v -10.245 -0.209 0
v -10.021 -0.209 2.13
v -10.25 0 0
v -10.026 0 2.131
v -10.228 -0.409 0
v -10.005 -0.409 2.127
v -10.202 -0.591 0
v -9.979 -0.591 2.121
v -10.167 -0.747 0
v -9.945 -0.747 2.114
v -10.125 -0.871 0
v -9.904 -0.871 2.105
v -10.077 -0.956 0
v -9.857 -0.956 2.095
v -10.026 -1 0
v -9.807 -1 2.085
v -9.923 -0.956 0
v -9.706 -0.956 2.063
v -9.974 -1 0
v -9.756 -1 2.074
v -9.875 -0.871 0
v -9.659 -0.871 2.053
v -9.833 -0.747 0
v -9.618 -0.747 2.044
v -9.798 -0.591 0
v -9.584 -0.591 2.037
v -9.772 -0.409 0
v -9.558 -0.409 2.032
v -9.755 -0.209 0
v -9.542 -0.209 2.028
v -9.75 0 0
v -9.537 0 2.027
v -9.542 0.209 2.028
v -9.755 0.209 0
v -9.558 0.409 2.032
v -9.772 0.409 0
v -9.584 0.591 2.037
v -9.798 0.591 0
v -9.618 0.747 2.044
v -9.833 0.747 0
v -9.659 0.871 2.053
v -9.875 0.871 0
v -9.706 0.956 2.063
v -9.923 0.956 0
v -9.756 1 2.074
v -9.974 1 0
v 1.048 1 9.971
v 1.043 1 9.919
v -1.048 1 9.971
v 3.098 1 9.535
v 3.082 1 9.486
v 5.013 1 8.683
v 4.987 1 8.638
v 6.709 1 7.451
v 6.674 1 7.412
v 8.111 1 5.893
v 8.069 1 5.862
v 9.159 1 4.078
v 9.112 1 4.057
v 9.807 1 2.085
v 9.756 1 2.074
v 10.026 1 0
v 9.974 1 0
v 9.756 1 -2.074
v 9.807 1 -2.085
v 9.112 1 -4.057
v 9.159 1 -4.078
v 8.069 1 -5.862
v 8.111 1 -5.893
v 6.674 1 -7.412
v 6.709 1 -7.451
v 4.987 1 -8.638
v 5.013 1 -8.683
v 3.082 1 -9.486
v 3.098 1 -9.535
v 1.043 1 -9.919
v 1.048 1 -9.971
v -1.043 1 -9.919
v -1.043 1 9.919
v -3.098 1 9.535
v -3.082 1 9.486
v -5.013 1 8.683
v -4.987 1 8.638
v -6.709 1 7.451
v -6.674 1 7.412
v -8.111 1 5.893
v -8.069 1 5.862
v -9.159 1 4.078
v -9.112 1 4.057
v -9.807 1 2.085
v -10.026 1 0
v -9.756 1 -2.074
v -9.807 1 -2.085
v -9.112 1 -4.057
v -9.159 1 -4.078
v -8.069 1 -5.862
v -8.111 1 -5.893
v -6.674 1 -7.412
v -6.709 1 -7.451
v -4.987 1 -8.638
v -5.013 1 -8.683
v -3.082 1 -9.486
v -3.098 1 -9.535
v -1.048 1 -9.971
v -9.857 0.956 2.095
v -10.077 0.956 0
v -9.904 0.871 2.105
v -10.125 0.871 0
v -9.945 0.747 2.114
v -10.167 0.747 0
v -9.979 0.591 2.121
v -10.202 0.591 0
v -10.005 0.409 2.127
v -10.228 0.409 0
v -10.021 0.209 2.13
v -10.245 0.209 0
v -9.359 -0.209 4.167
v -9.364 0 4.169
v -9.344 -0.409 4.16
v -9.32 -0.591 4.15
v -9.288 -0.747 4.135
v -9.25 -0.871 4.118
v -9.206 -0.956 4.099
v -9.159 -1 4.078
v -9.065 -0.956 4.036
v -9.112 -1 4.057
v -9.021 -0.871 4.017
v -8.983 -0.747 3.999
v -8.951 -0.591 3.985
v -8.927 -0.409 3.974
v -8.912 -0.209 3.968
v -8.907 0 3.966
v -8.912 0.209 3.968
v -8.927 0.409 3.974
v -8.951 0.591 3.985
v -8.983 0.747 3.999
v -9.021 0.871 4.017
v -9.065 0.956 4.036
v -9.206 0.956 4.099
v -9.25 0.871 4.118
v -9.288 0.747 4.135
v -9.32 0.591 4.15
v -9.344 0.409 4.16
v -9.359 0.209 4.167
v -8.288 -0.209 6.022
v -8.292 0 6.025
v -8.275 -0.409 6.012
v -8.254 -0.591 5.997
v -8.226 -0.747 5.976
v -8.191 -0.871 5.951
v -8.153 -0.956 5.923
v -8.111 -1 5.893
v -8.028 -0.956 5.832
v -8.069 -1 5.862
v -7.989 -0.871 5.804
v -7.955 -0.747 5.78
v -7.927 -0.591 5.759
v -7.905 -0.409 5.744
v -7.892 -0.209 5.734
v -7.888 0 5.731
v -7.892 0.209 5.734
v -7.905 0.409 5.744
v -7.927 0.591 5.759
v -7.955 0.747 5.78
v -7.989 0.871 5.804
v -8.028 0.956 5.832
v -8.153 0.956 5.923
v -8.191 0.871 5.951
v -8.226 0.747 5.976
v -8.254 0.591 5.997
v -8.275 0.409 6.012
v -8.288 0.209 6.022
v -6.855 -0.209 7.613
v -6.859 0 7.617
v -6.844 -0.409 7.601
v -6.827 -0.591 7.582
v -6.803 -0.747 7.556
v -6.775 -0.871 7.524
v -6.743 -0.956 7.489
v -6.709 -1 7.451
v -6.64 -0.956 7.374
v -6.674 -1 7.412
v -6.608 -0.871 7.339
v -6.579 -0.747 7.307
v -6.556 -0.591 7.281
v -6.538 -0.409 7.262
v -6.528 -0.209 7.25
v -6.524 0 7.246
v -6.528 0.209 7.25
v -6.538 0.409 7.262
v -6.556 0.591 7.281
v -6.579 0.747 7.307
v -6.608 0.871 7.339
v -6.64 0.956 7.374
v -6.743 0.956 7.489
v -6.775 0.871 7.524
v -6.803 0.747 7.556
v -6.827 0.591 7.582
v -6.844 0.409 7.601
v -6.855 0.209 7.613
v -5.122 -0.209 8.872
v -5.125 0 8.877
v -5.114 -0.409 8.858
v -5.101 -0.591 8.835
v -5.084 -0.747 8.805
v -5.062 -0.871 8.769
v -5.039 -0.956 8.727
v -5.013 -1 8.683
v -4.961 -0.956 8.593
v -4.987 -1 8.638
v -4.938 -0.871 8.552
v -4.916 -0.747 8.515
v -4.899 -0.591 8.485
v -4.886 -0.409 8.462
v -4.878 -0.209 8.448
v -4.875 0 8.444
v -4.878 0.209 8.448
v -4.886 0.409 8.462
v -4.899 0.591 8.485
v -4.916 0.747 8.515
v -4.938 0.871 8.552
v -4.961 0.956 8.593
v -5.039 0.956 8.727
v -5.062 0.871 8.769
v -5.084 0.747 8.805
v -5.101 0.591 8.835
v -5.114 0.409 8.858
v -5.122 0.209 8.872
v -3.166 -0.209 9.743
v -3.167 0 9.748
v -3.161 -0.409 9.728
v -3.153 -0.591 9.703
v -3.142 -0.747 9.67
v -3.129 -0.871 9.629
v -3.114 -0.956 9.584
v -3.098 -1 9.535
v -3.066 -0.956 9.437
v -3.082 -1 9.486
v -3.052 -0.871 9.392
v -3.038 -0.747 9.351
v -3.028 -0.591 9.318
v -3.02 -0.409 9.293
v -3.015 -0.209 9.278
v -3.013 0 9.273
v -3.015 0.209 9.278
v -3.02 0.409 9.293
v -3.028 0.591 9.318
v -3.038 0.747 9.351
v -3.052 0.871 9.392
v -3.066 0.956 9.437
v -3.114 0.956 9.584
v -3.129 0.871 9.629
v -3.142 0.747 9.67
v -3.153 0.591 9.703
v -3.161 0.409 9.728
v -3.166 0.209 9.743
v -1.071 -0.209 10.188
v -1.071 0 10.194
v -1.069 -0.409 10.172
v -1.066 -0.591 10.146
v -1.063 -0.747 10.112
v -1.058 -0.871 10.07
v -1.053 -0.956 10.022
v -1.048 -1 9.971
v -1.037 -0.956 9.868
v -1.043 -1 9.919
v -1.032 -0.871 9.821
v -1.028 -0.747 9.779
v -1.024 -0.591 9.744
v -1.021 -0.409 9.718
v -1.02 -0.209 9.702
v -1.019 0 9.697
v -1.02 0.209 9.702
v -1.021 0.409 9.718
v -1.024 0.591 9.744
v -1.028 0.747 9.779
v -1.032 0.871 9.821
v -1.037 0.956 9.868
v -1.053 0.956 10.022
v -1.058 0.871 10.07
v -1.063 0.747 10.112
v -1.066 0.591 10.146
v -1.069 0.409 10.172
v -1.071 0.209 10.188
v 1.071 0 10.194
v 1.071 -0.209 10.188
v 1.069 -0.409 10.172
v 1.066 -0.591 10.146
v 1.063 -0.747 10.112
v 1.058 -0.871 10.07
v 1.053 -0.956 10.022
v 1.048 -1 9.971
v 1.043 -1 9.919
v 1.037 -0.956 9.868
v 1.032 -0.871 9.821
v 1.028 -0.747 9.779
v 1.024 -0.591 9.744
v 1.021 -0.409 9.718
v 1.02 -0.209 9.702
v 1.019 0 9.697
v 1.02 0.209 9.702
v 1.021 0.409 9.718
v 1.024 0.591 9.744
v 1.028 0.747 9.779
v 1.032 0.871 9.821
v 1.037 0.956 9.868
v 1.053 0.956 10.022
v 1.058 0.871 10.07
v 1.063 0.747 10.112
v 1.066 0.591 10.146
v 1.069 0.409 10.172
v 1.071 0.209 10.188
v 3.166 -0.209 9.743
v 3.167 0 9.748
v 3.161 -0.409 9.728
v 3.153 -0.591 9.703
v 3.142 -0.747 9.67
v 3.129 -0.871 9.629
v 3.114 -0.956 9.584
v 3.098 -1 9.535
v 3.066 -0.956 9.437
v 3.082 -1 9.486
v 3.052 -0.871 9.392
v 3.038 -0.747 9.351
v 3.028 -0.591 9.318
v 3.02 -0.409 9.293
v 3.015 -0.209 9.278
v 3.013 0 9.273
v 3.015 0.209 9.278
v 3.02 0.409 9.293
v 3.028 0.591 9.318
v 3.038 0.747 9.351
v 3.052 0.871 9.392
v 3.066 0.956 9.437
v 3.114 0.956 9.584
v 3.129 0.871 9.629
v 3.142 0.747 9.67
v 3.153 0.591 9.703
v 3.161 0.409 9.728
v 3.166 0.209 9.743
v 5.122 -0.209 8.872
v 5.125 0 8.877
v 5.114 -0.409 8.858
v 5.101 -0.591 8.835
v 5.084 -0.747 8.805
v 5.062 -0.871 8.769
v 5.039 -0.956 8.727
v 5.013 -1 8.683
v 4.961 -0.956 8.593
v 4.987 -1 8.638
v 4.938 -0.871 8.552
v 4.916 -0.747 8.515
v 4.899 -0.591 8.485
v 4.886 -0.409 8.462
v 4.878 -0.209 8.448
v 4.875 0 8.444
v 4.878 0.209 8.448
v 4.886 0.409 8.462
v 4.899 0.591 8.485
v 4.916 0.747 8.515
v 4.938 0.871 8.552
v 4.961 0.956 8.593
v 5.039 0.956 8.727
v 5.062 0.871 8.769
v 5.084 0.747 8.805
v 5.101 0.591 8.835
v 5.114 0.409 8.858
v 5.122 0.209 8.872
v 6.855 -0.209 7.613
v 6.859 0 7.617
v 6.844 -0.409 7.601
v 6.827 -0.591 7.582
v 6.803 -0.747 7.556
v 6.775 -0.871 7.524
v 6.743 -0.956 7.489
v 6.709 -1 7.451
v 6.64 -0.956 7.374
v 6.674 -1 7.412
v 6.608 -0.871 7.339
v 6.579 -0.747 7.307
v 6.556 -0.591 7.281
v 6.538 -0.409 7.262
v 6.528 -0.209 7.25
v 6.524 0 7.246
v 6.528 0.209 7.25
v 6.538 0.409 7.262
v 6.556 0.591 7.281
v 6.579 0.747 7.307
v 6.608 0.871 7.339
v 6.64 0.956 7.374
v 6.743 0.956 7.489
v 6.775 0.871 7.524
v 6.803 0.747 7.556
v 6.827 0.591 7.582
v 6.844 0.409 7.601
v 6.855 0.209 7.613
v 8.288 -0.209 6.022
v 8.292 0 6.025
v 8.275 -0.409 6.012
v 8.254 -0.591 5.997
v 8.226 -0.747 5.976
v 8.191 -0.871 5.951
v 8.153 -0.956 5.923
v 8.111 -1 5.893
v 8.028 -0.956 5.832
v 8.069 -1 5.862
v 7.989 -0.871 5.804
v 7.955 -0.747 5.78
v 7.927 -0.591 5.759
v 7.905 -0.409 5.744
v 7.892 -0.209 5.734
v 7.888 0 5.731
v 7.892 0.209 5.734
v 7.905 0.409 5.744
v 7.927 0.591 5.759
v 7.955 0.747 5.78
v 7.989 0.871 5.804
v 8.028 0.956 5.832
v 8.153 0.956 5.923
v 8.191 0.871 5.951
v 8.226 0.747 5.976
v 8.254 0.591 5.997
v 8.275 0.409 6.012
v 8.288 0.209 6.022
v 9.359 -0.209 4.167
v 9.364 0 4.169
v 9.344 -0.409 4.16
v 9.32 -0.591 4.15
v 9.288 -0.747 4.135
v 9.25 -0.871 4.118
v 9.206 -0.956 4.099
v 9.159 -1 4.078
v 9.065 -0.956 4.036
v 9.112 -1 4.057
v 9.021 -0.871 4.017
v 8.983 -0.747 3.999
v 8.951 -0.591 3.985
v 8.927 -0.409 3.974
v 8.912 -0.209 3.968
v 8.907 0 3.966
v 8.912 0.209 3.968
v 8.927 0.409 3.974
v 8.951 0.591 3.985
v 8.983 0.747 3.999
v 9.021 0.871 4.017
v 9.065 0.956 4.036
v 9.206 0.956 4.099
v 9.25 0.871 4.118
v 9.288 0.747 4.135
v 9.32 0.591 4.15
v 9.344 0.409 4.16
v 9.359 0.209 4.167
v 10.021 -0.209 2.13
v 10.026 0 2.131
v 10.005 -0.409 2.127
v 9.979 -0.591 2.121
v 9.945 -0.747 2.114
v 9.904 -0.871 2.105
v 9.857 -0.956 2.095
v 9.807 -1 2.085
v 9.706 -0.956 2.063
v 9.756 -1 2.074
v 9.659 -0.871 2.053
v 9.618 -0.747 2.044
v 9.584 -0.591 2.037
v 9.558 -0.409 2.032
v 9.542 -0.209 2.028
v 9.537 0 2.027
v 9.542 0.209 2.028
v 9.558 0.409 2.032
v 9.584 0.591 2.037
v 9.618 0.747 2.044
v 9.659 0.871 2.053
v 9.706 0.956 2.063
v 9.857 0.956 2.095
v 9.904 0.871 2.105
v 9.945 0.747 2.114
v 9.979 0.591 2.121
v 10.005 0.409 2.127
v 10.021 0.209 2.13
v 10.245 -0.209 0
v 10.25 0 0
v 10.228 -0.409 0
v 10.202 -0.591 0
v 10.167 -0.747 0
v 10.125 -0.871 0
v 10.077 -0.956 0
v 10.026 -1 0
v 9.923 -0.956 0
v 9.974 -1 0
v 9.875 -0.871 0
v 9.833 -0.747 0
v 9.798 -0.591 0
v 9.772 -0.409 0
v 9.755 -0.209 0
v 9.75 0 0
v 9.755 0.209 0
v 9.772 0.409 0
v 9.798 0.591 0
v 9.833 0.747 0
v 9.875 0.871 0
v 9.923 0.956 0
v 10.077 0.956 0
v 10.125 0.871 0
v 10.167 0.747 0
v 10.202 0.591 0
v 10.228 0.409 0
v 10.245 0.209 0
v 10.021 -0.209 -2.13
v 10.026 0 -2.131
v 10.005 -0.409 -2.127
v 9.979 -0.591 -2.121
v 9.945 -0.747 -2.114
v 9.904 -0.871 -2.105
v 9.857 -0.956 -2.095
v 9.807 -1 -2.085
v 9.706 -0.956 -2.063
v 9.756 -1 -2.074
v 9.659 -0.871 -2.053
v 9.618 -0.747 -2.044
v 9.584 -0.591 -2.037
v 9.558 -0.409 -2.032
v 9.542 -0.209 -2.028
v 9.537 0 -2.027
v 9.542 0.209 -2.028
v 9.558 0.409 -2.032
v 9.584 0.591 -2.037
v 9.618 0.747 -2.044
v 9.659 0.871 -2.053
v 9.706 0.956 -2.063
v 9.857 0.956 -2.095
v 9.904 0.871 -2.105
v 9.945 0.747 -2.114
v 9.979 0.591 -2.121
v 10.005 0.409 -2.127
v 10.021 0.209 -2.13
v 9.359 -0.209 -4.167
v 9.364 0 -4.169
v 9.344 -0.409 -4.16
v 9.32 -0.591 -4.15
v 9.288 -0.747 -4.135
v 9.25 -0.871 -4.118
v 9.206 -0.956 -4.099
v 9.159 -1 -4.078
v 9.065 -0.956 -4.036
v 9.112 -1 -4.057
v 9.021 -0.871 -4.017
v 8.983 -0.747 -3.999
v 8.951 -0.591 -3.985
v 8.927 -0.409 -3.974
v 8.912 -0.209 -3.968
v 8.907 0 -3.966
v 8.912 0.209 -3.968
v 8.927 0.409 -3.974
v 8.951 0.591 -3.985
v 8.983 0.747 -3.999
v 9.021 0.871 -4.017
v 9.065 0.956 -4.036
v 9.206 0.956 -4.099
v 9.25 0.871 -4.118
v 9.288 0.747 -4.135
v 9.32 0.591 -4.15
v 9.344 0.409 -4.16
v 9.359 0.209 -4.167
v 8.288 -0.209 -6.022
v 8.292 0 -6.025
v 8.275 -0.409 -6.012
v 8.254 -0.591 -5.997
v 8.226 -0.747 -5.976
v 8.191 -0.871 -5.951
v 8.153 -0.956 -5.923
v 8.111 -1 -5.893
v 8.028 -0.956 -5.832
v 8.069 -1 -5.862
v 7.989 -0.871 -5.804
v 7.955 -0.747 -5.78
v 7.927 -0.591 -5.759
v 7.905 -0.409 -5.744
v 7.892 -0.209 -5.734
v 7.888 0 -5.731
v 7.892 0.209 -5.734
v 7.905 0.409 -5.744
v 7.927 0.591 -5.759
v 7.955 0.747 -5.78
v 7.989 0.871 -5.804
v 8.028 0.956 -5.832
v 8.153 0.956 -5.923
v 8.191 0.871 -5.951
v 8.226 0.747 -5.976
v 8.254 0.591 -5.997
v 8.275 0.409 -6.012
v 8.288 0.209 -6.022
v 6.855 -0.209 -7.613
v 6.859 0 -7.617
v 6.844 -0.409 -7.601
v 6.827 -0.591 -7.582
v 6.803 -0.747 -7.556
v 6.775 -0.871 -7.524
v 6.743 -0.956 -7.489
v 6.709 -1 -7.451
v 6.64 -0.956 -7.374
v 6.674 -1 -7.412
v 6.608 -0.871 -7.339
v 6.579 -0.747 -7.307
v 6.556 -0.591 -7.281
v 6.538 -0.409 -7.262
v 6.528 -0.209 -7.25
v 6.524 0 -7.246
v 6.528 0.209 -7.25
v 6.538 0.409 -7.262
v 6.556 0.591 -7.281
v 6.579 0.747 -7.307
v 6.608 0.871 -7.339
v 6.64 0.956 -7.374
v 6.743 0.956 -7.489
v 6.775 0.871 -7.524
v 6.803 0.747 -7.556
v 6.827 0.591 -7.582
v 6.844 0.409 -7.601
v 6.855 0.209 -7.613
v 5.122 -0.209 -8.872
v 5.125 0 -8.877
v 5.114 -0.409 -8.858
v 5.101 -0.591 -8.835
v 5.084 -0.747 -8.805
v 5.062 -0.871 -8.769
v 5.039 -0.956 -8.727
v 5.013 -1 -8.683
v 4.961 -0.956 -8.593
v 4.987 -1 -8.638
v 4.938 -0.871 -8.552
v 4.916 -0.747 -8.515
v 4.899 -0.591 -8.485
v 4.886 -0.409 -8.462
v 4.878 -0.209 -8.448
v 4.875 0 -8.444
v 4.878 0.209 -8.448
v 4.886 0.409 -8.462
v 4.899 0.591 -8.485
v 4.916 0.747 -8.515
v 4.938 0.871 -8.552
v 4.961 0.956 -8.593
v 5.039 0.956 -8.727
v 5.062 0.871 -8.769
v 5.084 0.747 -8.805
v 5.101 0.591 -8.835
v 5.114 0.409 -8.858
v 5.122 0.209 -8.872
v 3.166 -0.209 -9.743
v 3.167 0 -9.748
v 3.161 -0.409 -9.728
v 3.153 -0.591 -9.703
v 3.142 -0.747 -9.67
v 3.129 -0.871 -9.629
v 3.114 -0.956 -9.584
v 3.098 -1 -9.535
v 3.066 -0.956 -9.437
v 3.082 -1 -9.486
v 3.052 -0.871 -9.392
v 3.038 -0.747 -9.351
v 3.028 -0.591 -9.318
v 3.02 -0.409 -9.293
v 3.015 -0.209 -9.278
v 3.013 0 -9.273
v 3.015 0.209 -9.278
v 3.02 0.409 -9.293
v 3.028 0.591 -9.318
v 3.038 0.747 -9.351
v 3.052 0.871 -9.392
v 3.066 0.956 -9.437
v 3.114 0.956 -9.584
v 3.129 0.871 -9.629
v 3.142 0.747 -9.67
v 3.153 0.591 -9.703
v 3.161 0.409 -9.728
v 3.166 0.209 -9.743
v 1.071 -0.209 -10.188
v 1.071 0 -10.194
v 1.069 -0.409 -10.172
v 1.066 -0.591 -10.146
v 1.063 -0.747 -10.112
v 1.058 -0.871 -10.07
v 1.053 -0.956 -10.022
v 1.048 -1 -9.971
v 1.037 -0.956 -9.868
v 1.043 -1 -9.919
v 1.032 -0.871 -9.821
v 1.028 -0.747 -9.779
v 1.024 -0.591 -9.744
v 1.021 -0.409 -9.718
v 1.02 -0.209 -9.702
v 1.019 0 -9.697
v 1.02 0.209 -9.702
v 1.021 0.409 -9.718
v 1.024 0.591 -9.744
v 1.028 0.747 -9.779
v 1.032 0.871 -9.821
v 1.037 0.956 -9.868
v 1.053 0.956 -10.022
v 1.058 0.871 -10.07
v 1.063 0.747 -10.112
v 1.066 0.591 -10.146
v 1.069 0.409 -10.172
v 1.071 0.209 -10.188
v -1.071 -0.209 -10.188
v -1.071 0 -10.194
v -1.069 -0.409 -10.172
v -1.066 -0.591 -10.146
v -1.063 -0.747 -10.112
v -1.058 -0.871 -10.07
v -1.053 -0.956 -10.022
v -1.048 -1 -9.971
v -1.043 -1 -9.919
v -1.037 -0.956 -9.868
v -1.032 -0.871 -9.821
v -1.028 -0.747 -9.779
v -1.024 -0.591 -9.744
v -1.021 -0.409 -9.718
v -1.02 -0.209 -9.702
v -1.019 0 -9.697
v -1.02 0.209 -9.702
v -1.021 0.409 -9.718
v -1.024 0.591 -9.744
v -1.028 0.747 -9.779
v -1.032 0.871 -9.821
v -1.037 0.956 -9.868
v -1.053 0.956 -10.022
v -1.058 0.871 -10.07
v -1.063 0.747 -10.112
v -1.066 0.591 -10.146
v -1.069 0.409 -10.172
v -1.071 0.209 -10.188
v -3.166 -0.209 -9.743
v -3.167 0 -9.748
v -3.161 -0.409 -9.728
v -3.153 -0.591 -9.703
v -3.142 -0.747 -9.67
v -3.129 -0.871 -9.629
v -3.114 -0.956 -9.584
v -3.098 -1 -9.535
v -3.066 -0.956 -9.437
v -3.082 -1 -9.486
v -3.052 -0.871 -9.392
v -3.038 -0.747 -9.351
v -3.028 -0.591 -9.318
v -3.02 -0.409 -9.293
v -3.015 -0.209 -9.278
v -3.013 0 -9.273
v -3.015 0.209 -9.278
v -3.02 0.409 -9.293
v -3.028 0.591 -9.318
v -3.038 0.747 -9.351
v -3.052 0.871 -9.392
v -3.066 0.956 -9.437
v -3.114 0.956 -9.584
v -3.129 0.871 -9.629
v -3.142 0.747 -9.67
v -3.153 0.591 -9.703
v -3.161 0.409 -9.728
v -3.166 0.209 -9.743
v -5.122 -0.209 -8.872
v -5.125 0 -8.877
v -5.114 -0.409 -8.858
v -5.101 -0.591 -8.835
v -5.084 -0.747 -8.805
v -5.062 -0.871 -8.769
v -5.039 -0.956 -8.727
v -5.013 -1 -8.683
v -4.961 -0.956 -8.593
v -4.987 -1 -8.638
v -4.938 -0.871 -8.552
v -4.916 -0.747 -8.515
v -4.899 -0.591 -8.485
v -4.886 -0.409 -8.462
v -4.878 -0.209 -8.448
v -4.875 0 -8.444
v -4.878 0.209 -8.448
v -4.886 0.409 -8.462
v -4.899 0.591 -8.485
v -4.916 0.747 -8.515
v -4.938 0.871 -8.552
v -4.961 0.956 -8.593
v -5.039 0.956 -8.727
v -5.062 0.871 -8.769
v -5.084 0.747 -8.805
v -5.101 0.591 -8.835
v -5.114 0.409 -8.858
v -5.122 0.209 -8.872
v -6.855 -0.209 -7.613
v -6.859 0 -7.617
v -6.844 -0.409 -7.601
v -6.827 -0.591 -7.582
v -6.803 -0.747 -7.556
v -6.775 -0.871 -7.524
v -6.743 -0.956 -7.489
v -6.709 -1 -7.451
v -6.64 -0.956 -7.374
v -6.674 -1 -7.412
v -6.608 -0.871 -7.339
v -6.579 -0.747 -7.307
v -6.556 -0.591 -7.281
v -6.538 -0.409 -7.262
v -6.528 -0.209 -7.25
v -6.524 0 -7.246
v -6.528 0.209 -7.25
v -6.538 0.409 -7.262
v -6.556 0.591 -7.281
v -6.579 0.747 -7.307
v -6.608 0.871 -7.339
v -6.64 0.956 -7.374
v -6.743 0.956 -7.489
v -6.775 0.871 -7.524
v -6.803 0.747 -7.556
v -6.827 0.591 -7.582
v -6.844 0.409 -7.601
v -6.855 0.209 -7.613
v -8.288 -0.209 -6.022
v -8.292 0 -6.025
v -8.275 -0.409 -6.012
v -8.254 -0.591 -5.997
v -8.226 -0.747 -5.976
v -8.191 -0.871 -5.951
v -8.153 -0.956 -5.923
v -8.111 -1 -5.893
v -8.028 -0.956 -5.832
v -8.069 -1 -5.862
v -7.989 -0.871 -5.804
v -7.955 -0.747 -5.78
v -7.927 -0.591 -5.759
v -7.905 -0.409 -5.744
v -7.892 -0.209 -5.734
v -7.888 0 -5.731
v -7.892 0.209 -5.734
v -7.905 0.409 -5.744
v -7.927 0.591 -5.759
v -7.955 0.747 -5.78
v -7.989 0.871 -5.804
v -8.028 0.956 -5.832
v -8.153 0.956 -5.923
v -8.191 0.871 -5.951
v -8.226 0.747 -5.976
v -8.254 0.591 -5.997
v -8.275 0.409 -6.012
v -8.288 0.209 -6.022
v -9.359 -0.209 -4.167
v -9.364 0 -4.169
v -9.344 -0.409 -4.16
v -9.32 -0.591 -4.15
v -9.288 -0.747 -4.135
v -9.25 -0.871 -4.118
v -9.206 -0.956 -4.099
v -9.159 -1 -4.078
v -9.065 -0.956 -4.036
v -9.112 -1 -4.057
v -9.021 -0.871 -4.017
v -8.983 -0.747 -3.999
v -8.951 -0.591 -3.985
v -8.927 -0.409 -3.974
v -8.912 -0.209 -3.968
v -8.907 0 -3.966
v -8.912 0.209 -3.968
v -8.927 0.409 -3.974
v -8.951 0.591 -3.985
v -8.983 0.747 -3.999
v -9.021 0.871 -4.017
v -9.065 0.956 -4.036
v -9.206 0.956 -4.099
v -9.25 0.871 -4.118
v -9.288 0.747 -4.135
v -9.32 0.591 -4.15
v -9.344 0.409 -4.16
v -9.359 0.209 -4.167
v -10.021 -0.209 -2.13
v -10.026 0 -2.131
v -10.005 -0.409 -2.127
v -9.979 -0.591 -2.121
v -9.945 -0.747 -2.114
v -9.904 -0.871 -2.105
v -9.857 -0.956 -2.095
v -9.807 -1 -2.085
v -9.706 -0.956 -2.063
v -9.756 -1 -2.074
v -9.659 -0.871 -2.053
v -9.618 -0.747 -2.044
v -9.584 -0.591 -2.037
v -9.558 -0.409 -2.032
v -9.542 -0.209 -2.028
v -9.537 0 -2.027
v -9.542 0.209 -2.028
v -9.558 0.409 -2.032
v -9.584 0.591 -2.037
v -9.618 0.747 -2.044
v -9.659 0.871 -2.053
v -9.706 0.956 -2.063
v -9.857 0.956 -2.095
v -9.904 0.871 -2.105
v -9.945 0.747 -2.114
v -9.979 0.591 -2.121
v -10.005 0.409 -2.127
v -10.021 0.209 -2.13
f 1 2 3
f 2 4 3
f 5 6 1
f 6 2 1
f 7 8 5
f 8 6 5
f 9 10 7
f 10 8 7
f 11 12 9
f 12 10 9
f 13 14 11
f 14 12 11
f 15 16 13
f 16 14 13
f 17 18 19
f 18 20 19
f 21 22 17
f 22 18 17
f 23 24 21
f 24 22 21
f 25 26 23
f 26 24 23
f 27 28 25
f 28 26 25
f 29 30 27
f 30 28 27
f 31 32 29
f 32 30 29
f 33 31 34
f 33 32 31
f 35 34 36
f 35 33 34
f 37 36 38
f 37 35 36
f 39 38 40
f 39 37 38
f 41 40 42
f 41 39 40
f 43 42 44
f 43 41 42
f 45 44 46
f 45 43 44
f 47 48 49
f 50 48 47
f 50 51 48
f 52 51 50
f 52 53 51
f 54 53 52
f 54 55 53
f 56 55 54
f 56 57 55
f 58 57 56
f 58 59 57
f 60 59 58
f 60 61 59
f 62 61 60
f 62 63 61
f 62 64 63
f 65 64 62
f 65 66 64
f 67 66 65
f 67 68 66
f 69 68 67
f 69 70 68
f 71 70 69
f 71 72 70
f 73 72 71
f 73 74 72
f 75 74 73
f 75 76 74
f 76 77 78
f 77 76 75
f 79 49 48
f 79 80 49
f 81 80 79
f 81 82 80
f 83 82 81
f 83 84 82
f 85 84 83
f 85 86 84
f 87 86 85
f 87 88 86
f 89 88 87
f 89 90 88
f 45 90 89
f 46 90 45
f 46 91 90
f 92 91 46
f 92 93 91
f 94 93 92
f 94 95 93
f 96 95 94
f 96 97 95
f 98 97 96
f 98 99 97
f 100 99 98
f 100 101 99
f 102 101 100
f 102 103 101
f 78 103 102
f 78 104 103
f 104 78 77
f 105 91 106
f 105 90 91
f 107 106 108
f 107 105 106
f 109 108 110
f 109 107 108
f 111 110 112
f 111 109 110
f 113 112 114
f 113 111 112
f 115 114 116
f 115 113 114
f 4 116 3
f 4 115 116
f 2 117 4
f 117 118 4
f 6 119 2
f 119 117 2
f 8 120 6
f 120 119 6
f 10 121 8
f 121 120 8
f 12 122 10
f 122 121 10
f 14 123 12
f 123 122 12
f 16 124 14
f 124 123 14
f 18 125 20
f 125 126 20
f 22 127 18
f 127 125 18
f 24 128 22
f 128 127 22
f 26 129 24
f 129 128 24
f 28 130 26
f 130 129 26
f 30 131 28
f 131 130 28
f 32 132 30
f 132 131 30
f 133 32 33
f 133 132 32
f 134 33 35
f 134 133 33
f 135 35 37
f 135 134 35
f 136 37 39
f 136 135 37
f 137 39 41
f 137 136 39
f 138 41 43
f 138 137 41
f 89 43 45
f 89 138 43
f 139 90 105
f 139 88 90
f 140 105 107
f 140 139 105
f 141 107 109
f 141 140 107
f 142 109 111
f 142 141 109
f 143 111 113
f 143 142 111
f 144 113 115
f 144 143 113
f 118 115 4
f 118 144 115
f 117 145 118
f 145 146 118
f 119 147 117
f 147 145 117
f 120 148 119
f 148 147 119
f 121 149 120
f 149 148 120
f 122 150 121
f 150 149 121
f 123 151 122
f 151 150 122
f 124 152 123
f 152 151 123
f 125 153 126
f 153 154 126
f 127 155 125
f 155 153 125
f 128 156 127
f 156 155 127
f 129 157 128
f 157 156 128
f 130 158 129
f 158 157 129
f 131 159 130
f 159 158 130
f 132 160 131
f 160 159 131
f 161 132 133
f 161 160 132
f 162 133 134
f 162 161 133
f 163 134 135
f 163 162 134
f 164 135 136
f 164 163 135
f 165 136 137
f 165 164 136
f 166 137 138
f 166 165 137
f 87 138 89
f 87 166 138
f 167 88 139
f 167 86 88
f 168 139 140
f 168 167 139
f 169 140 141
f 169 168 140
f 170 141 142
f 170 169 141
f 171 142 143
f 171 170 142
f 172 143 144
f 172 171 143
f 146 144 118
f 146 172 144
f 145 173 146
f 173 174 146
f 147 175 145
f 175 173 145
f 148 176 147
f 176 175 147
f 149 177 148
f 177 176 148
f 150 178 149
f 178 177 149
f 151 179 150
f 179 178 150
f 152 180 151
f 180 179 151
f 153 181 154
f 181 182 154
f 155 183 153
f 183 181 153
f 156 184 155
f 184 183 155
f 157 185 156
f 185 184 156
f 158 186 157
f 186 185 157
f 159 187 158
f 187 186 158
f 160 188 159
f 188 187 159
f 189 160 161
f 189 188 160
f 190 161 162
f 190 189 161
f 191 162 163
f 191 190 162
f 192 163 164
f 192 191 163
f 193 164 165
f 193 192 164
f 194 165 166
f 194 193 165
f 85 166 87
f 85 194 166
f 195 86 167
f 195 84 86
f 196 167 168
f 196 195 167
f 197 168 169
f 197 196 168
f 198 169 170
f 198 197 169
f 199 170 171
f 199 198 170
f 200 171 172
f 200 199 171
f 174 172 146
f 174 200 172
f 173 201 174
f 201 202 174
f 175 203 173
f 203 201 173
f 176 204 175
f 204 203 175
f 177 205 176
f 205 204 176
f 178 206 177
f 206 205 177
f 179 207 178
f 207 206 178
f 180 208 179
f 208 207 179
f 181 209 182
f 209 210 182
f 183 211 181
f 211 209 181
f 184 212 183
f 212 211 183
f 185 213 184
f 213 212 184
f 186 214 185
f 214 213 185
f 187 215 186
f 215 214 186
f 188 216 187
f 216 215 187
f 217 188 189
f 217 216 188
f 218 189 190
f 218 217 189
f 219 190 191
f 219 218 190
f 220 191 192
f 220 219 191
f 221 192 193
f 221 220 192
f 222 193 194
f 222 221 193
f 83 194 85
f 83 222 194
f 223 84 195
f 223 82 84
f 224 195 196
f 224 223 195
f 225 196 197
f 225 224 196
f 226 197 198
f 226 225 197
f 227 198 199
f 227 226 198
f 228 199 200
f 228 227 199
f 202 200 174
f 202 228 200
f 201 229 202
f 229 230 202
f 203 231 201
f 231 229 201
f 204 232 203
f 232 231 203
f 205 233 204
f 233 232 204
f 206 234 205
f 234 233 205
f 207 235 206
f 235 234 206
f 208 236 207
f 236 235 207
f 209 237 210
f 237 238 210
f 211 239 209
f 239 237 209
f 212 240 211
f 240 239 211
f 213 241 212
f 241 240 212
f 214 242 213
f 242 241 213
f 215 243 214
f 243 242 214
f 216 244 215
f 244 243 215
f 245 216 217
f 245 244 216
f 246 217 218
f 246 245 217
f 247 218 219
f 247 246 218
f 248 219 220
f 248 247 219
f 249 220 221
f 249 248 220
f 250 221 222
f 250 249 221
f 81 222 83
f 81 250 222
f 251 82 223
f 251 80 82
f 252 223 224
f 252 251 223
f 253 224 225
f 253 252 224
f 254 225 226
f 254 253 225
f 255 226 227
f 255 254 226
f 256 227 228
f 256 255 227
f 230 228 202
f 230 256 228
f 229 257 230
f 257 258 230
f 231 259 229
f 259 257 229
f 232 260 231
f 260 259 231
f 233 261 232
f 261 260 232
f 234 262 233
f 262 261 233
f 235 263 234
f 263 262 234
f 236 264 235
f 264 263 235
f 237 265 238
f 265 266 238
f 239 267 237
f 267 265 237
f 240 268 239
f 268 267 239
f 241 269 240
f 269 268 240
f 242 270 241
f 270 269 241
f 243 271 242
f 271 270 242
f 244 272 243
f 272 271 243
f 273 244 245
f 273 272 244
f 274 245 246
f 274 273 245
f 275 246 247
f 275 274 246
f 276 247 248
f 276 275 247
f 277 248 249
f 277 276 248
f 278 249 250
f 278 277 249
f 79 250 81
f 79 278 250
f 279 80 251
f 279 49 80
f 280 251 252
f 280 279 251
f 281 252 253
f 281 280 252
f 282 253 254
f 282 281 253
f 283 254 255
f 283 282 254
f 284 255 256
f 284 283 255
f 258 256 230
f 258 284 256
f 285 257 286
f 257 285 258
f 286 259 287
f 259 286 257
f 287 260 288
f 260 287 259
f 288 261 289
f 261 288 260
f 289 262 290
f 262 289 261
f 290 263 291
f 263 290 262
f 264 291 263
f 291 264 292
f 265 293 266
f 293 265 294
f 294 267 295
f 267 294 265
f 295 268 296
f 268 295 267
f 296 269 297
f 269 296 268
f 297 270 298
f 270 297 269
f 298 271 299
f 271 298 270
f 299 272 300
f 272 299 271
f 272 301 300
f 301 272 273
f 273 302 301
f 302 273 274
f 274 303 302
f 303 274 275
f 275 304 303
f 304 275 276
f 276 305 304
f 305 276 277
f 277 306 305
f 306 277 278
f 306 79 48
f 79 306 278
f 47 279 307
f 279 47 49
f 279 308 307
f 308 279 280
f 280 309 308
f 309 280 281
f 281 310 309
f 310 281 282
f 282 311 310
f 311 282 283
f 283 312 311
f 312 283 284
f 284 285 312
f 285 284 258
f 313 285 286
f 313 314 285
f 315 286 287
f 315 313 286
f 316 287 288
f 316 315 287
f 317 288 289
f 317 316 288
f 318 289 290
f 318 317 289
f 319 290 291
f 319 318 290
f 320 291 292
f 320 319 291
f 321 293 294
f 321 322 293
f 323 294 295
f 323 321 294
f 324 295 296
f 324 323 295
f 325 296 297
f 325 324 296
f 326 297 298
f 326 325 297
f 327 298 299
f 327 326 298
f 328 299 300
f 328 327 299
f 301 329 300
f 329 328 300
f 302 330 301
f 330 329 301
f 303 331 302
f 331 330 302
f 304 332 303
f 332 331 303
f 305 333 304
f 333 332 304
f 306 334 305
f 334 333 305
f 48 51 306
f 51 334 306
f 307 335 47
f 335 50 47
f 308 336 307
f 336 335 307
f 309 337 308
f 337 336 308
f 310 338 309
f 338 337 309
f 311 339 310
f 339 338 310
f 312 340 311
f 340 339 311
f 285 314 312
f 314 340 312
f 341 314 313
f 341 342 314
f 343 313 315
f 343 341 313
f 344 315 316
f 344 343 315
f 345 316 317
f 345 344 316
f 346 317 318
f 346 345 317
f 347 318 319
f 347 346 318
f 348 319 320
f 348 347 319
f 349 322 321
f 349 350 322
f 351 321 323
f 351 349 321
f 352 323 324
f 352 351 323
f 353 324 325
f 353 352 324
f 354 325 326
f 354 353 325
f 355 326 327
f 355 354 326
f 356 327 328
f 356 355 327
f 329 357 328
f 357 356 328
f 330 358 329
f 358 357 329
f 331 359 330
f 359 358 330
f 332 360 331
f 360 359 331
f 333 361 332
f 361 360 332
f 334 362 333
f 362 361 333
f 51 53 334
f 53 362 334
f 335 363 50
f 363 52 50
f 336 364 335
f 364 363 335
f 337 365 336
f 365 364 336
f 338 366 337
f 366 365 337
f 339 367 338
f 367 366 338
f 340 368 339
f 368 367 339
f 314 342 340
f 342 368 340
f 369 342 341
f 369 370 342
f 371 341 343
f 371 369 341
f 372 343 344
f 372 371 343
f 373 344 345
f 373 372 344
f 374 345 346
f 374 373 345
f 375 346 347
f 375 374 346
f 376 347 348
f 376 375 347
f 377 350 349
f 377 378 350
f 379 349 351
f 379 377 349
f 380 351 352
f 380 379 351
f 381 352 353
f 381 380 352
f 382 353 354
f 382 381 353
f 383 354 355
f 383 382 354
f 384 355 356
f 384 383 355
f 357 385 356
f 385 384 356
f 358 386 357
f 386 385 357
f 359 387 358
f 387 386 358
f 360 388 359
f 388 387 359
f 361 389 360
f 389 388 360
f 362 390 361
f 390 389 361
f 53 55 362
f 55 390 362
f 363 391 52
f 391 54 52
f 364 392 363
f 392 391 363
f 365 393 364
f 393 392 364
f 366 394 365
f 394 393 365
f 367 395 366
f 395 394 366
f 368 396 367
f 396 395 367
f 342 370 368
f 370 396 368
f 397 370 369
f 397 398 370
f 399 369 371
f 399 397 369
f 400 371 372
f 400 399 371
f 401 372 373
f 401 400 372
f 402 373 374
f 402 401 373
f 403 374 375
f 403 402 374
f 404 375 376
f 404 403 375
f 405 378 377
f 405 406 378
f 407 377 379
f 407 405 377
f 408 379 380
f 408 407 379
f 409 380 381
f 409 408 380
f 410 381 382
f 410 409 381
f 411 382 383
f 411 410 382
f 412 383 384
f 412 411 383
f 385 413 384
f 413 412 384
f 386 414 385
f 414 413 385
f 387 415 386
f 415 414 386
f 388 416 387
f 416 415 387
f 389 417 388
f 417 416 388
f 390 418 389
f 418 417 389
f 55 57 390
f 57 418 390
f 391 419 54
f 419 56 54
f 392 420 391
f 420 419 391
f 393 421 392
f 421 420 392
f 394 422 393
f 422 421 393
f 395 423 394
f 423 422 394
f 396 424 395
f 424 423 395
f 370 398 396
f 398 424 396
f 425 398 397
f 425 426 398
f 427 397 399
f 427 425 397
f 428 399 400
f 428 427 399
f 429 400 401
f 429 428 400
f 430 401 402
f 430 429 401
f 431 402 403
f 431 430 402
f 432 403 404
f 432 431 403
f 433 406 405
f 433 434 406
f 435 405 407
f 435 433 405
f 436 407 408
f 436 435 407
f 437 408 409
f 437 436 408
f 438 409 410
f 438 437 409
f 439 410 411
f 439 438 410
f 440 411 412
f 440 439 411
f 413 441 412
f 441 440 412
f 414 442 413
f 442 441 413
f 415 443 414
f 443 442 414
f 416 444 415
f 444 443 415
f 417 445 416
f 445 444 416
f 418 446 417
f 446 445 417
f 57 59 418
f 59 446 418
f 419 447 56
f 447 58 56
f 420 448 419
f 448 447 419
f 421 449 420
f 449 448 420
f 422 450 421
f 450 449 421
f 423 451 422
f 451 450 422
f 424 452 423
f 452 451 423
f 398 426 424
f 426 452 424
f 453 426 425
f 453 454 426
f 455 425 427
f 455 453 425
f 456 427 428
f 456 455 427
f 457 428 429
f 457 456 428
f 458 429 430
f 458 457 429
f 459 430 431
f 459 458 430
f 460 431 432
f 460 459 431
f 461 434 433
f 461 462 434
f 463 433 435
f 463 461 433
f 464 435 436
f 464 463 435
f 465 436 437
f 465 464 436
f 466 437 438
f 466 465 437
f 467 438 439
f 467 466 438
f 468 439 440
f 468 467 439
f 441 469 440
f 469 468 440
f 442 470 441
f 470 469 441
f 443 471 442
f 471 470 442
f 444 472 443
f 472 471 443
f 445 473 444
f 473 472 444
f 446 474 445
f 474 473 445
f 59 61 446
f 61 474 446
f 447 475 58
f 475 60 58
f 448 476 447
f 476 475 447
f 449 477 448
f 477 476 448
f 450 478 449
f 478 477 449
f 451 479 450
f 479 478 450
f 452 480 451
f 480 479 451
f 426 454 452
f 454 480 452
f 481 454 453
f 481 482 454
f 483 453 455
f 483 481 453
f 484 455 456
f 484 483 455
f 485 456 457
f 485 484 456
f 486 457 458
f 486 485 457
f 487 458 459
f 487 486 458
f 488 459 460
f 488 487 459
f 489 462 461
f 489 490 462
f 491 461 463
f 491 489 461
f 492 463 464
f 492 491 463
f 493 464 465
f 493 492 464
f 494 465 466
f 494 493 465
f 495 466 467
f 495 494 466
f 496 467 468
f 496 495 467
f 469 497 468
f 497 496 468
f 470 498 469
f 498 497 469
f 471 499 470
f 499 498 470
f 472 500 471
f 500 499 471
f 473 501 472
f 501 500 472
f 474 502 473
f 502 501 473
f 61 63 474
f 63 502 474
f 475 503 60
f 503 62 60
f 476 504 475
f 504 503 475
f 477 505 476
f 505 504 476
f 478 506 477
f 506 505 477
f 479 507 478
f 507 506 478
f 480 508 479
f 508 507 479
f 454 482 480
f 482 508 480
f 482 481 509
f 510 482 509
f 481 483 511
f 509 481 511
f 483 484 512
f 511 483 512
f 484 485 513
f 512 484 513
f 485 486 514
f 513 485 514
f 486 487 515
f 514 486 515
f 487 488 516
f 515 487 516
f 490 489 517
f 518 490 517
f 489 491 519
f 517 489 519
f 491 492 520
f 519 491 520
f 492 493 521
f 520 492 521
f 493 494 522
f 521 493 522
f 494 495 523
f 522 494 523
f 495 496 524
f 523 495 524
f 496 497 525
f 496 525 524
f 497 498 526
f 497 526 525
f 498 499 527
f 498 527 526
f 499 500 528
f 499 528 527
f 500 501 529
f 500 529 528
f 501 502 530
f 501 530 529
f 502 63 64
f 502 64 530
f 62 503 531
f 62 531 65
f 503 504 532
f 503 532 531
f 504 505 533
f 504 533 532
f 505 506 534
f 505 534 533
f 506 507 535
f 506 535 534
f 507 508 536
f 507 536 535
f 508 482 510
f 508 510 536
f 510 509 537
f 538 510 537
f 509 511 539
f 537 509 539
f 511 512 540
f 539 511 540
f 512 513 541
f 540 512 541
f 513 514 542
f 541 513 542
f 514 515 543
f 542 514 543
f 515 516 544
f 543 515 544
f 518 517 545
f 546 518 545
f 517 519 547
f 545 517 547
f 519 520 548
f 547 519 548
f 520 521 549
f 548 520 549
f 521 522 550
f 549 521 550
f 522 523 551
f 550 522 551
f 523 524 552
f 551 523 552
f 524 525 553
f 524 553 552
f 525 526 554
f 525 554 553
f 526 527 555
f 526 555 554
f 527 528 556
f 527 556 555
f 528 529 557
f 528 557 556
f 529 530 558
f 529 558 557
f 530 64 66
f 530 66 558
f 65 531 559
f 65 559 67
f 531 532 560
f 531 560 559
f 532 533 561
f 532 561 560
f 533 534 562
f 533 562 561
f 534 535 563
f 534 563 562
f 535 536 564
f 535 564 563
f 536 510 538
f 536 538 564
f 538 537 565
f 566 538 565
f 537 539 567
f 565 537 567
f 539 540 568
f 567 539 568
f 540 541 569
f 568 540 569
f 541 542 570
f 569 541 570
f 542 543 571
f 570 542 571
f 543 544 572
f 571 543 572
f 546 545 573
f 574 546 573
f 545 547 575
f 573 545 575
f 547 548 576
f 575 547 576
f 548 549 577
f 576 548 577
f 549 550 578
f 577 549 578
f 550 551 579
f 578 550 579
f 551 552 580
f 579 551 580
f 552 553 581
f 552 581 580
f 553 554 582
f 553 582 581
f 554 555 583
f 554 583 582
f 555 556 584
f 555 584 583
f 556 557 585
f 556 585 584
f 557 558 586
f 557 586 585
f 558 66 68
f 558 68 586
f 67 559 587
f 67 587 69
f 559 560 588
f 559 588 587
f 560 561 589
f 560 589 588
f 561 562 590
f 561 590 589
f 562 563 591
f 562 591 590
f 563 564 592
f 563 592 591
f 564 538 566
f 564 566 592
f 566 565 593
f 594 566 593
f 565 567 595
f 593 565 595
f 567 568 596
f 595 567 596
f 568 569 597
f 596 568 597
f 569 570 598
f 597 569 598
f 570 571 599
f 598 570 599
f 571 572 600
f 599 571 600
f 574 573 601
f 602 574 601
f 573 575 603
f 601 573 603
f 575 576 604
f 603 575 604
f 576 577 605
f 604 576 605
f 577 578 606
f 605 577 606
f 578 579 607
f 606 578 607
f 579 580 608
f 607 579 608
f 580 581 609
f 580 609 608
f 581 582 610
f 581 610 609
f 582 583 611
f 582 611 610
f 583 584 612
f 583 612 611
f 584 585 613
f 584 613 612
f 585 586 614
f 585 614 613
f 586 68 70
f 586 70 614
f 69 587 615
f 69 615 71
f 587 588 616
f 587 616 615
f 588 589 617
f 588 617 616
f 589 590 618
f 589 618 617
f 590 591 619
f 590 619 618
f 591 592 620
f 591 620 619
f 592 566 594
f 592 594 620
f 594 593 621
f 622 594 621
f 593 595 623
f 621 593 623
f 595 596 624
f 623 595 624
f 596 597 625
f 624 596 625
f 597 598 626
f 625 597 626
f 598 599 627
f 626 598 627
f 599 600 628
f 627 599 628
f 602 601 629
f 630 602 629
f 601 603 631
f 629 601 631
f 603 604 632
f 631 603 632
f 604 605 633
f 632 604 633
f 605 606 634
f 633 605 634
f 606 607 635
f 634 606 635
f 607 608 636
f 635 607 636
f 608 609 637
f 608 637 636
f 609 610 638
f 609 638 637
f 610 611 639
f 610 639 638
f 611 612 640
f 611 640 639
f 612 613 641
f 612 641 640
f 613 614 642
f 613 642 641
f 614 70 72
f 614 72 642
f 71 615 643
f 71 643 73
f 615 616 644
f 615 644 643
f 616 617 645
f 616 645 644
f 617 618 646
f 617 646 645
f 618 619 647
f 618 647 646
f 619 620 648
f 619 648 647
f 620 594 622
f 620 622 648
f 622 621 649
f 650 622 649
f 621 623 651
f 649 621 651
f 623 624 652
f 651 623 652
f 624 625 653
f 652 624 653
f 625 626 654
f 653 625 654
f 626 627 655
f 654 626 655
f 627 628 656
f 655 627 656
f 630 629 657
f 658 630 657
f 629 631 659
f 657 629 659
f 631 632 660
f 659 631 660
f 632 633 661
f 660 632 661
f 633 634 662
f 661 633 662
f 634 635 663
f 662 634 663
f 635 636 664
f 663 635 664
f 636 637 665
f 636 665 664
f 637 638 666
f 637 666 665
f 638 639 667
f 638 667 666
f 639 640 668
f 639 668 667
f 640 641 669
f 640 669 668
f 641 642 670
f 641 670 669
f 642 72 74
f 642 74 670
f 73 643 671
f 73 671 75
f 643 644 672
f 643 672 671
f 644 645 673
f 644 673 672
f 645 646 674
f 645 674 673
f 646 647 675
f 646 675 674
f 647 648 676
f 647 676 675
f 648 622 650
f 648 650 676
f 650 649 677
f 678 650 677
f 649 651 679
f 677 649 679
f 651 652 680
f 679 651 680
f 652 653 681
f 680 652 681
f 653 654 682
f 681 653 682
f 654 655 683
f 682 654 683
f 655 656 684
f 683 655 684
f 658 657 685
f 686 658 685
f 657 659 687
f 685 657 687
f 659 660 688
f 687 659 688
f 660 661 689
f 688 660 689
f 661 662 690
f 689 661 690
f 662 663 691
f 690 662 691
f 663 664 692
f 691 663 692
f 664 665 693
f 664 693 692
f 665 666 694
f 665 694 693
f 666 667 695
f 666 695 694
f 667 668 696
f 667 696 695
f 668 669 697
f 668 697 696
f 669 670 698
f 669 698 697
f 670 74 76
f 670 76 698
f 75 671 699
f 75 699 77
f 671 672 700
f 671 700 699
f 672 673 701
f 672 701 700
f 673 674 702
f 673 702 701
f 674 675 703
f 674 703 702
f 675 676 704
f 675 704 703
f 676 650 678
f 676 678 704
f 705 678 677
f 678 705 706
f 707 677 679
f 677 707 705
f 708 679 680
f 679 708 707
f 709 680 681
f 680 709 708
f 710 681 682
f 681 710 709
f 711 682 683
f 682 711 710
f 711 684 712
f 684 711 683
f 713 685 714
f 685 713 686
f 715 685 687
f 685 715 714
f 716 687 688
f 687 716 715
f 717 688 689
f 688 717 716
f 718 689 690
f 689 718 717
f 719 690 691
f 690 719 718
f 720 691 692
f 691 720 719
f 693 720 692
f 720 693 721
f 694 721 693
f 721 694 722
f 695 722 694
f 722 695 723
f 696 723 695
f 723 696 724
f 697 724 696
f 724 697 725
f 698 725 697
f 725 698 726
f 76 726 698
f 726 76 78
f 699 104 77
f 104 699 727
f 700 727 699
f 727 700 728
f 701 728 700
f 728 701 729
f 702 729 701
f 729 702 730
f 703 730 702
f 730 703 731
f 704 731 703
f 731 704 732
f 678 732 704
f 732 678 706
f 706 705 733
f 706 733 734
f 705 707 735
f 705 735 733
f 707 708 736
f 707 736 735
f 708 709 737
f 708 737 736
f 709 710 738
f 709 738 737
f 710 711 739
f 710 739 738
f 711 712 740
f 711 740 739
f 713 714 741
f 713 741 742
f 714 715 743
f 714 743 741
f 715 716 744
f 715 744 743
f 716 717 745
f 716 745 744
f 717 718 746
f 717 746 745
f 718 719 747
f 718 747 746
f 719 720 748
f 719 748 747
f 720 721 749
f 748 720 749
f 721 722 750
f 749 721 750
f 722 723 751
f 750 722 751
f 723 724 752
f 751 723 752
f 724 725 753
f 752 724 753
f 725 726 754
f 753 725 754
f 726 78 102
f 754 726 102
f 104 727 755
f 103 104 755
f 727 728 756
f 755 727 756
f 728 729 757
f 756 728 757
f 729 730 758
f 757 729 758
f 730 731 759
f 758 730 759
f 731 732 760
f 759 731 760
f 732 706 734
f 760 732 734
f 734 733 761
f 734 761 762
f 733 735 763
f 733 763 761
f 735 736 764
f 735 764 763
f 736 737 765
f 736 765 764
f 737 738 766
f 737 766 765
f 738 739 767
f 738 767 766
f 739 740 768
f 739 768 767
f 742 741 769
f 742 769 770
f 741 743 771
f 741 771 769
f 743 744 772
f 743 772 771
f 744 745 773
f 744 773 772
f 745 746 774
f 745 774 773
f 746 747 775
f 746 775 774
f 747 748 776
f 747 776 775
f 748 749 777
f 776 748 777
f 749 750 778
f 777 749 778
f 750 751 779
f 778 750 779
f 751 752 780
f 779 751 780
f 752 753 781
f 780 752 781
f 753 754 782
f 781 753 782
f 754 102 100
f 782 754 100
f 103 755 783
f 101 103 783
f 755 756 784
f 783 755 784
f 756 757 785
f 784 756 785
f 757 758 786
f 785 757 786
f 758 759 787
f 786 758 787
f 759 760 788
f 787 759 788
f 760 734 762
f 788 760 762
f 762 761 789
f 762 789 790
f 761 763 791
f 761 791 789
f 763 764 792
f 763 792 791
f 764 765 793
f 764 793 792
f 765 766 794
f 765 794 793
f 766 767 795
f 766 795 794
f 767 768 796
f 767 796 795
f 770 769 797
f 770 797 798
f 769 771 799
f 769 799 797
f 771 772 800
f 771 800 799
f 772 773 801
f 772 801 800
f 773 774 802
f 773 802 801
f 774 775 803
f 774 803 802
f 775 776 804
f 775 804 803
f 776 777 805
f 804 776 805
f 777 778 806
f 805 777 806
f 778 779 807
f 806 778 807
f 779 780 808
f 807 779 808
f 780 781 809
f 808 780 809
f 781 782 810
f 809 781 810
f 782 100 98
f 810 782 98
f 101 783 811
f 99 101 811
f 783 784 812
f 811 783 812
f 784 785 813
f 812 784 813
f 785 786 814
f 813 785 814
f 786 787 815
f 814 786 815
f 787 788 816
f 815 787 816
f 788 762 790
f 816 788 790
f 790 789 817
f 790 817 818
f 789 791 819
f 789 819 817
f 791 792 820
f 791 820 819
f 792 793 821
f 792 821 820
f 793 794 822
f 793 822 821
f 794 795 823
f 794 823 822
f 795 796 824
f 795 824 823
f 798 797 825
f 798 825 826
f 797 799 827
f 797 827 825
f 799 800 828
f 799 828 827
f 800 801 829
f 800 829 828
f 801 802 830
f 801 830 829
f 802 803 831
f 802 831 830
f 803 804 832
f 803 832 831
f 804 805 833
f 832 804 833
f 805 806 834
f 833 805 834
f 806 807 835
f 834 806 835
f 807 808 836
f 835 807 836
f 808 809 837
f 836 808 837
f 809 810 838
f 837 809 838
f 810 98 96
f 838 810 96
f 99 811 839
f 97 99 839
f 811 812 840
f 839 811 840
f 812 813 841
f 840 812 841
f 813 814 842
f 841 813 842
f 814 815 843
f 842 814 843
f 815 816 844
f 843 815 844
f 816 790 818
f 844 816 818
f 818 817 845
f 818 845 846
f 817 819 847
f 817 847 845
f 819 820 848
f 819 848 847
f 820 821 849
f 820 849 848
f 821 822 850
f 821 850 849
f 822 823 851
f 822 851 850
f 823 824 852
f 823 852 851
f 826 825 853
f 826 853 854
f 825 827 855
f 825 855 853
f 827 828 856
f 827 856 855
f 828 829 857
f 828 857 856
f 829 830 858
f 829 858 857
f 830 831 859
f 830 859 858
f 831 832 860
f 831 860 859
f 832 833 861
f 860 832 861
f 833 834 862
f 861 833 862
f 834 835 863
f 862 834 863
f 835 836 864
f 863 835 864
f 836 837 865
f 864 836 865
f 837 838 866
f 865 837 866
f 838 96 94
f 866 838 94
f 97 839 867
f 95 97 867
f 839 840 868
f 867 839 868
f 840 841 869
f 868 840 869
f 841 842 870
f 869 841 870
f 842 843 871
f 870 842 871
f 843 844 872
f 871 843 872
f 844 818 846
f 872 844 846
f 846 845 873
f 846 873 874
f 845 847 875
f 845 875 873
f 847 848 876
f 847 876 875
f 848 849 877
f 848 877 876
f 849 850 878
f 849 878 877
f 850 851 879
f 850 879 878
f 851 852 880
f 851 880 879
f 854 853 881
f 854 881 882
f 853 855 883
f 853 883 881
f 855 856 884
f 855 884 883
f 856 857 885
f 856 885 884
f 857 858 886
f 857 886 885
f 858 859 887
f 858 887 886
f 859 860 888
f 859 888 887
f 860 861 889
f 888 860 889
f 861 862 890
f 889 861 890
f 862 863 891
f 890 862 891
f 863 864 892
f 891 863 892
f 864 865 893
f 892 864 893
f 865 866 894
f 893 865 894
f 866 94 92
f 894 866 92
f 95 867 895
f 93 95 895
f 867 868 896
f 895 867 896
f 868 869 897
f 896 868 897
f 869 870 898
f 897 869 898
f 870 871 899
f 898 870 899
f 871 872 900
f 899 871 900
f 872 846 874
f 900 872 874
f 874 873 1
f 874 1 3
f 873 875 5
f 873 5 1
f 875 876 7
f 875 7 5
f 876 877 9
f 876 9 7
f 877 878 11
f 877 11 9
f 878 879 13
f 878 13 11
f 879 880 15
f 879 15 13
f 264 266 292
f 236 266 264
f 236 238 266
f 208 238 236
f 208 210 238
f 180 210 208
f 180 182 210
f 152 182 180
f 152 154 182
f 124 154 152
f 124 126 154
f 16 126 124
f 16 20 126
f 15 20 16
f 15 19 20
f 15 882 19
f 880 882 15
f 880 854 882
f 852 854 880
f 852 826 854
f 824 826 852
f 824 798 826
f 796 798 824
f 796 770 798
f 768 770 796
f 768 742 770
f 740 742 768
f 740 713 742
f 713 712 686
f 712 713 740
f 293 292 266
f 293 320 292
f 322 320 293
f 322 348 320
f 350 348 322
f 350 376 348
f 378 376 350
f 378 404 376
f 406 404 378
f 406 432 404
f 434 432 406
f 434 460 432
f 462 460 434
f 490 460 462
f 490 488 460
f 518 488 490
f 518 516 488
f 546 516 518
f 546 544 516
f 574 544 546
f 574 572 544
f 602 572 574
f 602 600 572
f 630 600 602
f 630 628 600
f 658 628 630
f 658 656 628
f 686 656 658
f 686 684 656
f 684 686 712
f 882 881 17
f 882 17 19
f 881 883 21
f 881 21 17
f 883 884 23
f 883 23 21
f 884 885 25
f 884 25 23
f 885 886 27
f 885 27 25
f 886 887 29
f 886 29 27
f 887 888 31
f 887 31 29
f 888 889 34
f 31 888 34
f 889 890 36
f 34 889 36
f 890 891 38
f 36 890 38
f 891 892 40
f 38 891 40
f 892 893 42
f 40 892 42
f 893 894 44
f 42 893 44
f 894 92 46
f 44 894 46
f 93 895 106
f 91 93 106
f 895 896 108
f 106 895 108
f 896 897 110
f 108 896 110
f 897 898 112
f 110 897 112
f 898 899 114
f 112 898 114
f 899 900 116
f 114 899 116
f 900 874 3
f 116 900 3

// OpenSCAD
/////////////////////////////////////////////////////////////////////////////////////////////////////////////////////////////////Ring/////////////////////////////////////////////
/*///////////////////////////////////////////////////////////////////////////////////////







*/
phi = 1.618; //do not change

pi = 3.141; //do not change
///////////////////////////////////////////////////////////////////////////////////////////////////////////////////////////////////parameters//////////////////////////////////////////////////////////////////////////////////////////////////////////////////////////////

$fn = 30;

inner_diameter = 20;

thickness_ratio = [.5,2];

ring_width = 6;





diamond = 0;
		
		diamond_height_top = 1.5;
		
		diamond_height_bottom = 3;
		
		diamond_diameter_top = 3.5;
		
		diamond_diameter_middle = 5;
		
		diamond_diameter_bottom = 2;
		
		little_diamond_size = 1;
		
		facets = 12;




///////////////////////////////////////////////////////////////////////////////////////////////////////////////////////////////////renders/////////////////////////////////////////////////////////////////////////////////////////////////////////////////////////////////

ring_base();






//////////////////////////////////////////////////////////////////////////////////////////////////////////////////////////////////modules//////////////////////////////////////////////////////////////////////////////////////////////////////////////////////////////////


module ring_base(){
	rotate([90,0,0])
		difference(){
			rotate_extrude()
				translate([inner_diameter/2,0,0])
					resize(thickness_ratio)
						circle(ring_width);
			cylinder(ring_width*thickness_ratio[1]*2,inner_diameter/2-ring_width/2,inner_diameter/2-ring_width/2,center = true);
		}
	translate([0,0,inner_diameter/2+ring_width*thickness_ratio[0]-1]){
		if(diamond)diamondMod();
	}
}

module diamondMod(){
	
	intersection(){
		union(){
			cylinder(diamond_height_bottom,
						diamond_diameter_bottom,
						diamond_diameter_middle,
						$fn=facets);
			translate([0,0,diamond_height_bottom])
				cylinder(diamond_height_top,
							diamond_diameter_middle,
							diamond_diameter_top,
							$fn=facets);
		}
			rotate([0,0,360/facets/2])
			cylinder(diamond_height_bottom+diamond_height_top,
							r=diamond_diameter_middle-(little_diamond_size*.01),$fn = facets);
		
	}
}
